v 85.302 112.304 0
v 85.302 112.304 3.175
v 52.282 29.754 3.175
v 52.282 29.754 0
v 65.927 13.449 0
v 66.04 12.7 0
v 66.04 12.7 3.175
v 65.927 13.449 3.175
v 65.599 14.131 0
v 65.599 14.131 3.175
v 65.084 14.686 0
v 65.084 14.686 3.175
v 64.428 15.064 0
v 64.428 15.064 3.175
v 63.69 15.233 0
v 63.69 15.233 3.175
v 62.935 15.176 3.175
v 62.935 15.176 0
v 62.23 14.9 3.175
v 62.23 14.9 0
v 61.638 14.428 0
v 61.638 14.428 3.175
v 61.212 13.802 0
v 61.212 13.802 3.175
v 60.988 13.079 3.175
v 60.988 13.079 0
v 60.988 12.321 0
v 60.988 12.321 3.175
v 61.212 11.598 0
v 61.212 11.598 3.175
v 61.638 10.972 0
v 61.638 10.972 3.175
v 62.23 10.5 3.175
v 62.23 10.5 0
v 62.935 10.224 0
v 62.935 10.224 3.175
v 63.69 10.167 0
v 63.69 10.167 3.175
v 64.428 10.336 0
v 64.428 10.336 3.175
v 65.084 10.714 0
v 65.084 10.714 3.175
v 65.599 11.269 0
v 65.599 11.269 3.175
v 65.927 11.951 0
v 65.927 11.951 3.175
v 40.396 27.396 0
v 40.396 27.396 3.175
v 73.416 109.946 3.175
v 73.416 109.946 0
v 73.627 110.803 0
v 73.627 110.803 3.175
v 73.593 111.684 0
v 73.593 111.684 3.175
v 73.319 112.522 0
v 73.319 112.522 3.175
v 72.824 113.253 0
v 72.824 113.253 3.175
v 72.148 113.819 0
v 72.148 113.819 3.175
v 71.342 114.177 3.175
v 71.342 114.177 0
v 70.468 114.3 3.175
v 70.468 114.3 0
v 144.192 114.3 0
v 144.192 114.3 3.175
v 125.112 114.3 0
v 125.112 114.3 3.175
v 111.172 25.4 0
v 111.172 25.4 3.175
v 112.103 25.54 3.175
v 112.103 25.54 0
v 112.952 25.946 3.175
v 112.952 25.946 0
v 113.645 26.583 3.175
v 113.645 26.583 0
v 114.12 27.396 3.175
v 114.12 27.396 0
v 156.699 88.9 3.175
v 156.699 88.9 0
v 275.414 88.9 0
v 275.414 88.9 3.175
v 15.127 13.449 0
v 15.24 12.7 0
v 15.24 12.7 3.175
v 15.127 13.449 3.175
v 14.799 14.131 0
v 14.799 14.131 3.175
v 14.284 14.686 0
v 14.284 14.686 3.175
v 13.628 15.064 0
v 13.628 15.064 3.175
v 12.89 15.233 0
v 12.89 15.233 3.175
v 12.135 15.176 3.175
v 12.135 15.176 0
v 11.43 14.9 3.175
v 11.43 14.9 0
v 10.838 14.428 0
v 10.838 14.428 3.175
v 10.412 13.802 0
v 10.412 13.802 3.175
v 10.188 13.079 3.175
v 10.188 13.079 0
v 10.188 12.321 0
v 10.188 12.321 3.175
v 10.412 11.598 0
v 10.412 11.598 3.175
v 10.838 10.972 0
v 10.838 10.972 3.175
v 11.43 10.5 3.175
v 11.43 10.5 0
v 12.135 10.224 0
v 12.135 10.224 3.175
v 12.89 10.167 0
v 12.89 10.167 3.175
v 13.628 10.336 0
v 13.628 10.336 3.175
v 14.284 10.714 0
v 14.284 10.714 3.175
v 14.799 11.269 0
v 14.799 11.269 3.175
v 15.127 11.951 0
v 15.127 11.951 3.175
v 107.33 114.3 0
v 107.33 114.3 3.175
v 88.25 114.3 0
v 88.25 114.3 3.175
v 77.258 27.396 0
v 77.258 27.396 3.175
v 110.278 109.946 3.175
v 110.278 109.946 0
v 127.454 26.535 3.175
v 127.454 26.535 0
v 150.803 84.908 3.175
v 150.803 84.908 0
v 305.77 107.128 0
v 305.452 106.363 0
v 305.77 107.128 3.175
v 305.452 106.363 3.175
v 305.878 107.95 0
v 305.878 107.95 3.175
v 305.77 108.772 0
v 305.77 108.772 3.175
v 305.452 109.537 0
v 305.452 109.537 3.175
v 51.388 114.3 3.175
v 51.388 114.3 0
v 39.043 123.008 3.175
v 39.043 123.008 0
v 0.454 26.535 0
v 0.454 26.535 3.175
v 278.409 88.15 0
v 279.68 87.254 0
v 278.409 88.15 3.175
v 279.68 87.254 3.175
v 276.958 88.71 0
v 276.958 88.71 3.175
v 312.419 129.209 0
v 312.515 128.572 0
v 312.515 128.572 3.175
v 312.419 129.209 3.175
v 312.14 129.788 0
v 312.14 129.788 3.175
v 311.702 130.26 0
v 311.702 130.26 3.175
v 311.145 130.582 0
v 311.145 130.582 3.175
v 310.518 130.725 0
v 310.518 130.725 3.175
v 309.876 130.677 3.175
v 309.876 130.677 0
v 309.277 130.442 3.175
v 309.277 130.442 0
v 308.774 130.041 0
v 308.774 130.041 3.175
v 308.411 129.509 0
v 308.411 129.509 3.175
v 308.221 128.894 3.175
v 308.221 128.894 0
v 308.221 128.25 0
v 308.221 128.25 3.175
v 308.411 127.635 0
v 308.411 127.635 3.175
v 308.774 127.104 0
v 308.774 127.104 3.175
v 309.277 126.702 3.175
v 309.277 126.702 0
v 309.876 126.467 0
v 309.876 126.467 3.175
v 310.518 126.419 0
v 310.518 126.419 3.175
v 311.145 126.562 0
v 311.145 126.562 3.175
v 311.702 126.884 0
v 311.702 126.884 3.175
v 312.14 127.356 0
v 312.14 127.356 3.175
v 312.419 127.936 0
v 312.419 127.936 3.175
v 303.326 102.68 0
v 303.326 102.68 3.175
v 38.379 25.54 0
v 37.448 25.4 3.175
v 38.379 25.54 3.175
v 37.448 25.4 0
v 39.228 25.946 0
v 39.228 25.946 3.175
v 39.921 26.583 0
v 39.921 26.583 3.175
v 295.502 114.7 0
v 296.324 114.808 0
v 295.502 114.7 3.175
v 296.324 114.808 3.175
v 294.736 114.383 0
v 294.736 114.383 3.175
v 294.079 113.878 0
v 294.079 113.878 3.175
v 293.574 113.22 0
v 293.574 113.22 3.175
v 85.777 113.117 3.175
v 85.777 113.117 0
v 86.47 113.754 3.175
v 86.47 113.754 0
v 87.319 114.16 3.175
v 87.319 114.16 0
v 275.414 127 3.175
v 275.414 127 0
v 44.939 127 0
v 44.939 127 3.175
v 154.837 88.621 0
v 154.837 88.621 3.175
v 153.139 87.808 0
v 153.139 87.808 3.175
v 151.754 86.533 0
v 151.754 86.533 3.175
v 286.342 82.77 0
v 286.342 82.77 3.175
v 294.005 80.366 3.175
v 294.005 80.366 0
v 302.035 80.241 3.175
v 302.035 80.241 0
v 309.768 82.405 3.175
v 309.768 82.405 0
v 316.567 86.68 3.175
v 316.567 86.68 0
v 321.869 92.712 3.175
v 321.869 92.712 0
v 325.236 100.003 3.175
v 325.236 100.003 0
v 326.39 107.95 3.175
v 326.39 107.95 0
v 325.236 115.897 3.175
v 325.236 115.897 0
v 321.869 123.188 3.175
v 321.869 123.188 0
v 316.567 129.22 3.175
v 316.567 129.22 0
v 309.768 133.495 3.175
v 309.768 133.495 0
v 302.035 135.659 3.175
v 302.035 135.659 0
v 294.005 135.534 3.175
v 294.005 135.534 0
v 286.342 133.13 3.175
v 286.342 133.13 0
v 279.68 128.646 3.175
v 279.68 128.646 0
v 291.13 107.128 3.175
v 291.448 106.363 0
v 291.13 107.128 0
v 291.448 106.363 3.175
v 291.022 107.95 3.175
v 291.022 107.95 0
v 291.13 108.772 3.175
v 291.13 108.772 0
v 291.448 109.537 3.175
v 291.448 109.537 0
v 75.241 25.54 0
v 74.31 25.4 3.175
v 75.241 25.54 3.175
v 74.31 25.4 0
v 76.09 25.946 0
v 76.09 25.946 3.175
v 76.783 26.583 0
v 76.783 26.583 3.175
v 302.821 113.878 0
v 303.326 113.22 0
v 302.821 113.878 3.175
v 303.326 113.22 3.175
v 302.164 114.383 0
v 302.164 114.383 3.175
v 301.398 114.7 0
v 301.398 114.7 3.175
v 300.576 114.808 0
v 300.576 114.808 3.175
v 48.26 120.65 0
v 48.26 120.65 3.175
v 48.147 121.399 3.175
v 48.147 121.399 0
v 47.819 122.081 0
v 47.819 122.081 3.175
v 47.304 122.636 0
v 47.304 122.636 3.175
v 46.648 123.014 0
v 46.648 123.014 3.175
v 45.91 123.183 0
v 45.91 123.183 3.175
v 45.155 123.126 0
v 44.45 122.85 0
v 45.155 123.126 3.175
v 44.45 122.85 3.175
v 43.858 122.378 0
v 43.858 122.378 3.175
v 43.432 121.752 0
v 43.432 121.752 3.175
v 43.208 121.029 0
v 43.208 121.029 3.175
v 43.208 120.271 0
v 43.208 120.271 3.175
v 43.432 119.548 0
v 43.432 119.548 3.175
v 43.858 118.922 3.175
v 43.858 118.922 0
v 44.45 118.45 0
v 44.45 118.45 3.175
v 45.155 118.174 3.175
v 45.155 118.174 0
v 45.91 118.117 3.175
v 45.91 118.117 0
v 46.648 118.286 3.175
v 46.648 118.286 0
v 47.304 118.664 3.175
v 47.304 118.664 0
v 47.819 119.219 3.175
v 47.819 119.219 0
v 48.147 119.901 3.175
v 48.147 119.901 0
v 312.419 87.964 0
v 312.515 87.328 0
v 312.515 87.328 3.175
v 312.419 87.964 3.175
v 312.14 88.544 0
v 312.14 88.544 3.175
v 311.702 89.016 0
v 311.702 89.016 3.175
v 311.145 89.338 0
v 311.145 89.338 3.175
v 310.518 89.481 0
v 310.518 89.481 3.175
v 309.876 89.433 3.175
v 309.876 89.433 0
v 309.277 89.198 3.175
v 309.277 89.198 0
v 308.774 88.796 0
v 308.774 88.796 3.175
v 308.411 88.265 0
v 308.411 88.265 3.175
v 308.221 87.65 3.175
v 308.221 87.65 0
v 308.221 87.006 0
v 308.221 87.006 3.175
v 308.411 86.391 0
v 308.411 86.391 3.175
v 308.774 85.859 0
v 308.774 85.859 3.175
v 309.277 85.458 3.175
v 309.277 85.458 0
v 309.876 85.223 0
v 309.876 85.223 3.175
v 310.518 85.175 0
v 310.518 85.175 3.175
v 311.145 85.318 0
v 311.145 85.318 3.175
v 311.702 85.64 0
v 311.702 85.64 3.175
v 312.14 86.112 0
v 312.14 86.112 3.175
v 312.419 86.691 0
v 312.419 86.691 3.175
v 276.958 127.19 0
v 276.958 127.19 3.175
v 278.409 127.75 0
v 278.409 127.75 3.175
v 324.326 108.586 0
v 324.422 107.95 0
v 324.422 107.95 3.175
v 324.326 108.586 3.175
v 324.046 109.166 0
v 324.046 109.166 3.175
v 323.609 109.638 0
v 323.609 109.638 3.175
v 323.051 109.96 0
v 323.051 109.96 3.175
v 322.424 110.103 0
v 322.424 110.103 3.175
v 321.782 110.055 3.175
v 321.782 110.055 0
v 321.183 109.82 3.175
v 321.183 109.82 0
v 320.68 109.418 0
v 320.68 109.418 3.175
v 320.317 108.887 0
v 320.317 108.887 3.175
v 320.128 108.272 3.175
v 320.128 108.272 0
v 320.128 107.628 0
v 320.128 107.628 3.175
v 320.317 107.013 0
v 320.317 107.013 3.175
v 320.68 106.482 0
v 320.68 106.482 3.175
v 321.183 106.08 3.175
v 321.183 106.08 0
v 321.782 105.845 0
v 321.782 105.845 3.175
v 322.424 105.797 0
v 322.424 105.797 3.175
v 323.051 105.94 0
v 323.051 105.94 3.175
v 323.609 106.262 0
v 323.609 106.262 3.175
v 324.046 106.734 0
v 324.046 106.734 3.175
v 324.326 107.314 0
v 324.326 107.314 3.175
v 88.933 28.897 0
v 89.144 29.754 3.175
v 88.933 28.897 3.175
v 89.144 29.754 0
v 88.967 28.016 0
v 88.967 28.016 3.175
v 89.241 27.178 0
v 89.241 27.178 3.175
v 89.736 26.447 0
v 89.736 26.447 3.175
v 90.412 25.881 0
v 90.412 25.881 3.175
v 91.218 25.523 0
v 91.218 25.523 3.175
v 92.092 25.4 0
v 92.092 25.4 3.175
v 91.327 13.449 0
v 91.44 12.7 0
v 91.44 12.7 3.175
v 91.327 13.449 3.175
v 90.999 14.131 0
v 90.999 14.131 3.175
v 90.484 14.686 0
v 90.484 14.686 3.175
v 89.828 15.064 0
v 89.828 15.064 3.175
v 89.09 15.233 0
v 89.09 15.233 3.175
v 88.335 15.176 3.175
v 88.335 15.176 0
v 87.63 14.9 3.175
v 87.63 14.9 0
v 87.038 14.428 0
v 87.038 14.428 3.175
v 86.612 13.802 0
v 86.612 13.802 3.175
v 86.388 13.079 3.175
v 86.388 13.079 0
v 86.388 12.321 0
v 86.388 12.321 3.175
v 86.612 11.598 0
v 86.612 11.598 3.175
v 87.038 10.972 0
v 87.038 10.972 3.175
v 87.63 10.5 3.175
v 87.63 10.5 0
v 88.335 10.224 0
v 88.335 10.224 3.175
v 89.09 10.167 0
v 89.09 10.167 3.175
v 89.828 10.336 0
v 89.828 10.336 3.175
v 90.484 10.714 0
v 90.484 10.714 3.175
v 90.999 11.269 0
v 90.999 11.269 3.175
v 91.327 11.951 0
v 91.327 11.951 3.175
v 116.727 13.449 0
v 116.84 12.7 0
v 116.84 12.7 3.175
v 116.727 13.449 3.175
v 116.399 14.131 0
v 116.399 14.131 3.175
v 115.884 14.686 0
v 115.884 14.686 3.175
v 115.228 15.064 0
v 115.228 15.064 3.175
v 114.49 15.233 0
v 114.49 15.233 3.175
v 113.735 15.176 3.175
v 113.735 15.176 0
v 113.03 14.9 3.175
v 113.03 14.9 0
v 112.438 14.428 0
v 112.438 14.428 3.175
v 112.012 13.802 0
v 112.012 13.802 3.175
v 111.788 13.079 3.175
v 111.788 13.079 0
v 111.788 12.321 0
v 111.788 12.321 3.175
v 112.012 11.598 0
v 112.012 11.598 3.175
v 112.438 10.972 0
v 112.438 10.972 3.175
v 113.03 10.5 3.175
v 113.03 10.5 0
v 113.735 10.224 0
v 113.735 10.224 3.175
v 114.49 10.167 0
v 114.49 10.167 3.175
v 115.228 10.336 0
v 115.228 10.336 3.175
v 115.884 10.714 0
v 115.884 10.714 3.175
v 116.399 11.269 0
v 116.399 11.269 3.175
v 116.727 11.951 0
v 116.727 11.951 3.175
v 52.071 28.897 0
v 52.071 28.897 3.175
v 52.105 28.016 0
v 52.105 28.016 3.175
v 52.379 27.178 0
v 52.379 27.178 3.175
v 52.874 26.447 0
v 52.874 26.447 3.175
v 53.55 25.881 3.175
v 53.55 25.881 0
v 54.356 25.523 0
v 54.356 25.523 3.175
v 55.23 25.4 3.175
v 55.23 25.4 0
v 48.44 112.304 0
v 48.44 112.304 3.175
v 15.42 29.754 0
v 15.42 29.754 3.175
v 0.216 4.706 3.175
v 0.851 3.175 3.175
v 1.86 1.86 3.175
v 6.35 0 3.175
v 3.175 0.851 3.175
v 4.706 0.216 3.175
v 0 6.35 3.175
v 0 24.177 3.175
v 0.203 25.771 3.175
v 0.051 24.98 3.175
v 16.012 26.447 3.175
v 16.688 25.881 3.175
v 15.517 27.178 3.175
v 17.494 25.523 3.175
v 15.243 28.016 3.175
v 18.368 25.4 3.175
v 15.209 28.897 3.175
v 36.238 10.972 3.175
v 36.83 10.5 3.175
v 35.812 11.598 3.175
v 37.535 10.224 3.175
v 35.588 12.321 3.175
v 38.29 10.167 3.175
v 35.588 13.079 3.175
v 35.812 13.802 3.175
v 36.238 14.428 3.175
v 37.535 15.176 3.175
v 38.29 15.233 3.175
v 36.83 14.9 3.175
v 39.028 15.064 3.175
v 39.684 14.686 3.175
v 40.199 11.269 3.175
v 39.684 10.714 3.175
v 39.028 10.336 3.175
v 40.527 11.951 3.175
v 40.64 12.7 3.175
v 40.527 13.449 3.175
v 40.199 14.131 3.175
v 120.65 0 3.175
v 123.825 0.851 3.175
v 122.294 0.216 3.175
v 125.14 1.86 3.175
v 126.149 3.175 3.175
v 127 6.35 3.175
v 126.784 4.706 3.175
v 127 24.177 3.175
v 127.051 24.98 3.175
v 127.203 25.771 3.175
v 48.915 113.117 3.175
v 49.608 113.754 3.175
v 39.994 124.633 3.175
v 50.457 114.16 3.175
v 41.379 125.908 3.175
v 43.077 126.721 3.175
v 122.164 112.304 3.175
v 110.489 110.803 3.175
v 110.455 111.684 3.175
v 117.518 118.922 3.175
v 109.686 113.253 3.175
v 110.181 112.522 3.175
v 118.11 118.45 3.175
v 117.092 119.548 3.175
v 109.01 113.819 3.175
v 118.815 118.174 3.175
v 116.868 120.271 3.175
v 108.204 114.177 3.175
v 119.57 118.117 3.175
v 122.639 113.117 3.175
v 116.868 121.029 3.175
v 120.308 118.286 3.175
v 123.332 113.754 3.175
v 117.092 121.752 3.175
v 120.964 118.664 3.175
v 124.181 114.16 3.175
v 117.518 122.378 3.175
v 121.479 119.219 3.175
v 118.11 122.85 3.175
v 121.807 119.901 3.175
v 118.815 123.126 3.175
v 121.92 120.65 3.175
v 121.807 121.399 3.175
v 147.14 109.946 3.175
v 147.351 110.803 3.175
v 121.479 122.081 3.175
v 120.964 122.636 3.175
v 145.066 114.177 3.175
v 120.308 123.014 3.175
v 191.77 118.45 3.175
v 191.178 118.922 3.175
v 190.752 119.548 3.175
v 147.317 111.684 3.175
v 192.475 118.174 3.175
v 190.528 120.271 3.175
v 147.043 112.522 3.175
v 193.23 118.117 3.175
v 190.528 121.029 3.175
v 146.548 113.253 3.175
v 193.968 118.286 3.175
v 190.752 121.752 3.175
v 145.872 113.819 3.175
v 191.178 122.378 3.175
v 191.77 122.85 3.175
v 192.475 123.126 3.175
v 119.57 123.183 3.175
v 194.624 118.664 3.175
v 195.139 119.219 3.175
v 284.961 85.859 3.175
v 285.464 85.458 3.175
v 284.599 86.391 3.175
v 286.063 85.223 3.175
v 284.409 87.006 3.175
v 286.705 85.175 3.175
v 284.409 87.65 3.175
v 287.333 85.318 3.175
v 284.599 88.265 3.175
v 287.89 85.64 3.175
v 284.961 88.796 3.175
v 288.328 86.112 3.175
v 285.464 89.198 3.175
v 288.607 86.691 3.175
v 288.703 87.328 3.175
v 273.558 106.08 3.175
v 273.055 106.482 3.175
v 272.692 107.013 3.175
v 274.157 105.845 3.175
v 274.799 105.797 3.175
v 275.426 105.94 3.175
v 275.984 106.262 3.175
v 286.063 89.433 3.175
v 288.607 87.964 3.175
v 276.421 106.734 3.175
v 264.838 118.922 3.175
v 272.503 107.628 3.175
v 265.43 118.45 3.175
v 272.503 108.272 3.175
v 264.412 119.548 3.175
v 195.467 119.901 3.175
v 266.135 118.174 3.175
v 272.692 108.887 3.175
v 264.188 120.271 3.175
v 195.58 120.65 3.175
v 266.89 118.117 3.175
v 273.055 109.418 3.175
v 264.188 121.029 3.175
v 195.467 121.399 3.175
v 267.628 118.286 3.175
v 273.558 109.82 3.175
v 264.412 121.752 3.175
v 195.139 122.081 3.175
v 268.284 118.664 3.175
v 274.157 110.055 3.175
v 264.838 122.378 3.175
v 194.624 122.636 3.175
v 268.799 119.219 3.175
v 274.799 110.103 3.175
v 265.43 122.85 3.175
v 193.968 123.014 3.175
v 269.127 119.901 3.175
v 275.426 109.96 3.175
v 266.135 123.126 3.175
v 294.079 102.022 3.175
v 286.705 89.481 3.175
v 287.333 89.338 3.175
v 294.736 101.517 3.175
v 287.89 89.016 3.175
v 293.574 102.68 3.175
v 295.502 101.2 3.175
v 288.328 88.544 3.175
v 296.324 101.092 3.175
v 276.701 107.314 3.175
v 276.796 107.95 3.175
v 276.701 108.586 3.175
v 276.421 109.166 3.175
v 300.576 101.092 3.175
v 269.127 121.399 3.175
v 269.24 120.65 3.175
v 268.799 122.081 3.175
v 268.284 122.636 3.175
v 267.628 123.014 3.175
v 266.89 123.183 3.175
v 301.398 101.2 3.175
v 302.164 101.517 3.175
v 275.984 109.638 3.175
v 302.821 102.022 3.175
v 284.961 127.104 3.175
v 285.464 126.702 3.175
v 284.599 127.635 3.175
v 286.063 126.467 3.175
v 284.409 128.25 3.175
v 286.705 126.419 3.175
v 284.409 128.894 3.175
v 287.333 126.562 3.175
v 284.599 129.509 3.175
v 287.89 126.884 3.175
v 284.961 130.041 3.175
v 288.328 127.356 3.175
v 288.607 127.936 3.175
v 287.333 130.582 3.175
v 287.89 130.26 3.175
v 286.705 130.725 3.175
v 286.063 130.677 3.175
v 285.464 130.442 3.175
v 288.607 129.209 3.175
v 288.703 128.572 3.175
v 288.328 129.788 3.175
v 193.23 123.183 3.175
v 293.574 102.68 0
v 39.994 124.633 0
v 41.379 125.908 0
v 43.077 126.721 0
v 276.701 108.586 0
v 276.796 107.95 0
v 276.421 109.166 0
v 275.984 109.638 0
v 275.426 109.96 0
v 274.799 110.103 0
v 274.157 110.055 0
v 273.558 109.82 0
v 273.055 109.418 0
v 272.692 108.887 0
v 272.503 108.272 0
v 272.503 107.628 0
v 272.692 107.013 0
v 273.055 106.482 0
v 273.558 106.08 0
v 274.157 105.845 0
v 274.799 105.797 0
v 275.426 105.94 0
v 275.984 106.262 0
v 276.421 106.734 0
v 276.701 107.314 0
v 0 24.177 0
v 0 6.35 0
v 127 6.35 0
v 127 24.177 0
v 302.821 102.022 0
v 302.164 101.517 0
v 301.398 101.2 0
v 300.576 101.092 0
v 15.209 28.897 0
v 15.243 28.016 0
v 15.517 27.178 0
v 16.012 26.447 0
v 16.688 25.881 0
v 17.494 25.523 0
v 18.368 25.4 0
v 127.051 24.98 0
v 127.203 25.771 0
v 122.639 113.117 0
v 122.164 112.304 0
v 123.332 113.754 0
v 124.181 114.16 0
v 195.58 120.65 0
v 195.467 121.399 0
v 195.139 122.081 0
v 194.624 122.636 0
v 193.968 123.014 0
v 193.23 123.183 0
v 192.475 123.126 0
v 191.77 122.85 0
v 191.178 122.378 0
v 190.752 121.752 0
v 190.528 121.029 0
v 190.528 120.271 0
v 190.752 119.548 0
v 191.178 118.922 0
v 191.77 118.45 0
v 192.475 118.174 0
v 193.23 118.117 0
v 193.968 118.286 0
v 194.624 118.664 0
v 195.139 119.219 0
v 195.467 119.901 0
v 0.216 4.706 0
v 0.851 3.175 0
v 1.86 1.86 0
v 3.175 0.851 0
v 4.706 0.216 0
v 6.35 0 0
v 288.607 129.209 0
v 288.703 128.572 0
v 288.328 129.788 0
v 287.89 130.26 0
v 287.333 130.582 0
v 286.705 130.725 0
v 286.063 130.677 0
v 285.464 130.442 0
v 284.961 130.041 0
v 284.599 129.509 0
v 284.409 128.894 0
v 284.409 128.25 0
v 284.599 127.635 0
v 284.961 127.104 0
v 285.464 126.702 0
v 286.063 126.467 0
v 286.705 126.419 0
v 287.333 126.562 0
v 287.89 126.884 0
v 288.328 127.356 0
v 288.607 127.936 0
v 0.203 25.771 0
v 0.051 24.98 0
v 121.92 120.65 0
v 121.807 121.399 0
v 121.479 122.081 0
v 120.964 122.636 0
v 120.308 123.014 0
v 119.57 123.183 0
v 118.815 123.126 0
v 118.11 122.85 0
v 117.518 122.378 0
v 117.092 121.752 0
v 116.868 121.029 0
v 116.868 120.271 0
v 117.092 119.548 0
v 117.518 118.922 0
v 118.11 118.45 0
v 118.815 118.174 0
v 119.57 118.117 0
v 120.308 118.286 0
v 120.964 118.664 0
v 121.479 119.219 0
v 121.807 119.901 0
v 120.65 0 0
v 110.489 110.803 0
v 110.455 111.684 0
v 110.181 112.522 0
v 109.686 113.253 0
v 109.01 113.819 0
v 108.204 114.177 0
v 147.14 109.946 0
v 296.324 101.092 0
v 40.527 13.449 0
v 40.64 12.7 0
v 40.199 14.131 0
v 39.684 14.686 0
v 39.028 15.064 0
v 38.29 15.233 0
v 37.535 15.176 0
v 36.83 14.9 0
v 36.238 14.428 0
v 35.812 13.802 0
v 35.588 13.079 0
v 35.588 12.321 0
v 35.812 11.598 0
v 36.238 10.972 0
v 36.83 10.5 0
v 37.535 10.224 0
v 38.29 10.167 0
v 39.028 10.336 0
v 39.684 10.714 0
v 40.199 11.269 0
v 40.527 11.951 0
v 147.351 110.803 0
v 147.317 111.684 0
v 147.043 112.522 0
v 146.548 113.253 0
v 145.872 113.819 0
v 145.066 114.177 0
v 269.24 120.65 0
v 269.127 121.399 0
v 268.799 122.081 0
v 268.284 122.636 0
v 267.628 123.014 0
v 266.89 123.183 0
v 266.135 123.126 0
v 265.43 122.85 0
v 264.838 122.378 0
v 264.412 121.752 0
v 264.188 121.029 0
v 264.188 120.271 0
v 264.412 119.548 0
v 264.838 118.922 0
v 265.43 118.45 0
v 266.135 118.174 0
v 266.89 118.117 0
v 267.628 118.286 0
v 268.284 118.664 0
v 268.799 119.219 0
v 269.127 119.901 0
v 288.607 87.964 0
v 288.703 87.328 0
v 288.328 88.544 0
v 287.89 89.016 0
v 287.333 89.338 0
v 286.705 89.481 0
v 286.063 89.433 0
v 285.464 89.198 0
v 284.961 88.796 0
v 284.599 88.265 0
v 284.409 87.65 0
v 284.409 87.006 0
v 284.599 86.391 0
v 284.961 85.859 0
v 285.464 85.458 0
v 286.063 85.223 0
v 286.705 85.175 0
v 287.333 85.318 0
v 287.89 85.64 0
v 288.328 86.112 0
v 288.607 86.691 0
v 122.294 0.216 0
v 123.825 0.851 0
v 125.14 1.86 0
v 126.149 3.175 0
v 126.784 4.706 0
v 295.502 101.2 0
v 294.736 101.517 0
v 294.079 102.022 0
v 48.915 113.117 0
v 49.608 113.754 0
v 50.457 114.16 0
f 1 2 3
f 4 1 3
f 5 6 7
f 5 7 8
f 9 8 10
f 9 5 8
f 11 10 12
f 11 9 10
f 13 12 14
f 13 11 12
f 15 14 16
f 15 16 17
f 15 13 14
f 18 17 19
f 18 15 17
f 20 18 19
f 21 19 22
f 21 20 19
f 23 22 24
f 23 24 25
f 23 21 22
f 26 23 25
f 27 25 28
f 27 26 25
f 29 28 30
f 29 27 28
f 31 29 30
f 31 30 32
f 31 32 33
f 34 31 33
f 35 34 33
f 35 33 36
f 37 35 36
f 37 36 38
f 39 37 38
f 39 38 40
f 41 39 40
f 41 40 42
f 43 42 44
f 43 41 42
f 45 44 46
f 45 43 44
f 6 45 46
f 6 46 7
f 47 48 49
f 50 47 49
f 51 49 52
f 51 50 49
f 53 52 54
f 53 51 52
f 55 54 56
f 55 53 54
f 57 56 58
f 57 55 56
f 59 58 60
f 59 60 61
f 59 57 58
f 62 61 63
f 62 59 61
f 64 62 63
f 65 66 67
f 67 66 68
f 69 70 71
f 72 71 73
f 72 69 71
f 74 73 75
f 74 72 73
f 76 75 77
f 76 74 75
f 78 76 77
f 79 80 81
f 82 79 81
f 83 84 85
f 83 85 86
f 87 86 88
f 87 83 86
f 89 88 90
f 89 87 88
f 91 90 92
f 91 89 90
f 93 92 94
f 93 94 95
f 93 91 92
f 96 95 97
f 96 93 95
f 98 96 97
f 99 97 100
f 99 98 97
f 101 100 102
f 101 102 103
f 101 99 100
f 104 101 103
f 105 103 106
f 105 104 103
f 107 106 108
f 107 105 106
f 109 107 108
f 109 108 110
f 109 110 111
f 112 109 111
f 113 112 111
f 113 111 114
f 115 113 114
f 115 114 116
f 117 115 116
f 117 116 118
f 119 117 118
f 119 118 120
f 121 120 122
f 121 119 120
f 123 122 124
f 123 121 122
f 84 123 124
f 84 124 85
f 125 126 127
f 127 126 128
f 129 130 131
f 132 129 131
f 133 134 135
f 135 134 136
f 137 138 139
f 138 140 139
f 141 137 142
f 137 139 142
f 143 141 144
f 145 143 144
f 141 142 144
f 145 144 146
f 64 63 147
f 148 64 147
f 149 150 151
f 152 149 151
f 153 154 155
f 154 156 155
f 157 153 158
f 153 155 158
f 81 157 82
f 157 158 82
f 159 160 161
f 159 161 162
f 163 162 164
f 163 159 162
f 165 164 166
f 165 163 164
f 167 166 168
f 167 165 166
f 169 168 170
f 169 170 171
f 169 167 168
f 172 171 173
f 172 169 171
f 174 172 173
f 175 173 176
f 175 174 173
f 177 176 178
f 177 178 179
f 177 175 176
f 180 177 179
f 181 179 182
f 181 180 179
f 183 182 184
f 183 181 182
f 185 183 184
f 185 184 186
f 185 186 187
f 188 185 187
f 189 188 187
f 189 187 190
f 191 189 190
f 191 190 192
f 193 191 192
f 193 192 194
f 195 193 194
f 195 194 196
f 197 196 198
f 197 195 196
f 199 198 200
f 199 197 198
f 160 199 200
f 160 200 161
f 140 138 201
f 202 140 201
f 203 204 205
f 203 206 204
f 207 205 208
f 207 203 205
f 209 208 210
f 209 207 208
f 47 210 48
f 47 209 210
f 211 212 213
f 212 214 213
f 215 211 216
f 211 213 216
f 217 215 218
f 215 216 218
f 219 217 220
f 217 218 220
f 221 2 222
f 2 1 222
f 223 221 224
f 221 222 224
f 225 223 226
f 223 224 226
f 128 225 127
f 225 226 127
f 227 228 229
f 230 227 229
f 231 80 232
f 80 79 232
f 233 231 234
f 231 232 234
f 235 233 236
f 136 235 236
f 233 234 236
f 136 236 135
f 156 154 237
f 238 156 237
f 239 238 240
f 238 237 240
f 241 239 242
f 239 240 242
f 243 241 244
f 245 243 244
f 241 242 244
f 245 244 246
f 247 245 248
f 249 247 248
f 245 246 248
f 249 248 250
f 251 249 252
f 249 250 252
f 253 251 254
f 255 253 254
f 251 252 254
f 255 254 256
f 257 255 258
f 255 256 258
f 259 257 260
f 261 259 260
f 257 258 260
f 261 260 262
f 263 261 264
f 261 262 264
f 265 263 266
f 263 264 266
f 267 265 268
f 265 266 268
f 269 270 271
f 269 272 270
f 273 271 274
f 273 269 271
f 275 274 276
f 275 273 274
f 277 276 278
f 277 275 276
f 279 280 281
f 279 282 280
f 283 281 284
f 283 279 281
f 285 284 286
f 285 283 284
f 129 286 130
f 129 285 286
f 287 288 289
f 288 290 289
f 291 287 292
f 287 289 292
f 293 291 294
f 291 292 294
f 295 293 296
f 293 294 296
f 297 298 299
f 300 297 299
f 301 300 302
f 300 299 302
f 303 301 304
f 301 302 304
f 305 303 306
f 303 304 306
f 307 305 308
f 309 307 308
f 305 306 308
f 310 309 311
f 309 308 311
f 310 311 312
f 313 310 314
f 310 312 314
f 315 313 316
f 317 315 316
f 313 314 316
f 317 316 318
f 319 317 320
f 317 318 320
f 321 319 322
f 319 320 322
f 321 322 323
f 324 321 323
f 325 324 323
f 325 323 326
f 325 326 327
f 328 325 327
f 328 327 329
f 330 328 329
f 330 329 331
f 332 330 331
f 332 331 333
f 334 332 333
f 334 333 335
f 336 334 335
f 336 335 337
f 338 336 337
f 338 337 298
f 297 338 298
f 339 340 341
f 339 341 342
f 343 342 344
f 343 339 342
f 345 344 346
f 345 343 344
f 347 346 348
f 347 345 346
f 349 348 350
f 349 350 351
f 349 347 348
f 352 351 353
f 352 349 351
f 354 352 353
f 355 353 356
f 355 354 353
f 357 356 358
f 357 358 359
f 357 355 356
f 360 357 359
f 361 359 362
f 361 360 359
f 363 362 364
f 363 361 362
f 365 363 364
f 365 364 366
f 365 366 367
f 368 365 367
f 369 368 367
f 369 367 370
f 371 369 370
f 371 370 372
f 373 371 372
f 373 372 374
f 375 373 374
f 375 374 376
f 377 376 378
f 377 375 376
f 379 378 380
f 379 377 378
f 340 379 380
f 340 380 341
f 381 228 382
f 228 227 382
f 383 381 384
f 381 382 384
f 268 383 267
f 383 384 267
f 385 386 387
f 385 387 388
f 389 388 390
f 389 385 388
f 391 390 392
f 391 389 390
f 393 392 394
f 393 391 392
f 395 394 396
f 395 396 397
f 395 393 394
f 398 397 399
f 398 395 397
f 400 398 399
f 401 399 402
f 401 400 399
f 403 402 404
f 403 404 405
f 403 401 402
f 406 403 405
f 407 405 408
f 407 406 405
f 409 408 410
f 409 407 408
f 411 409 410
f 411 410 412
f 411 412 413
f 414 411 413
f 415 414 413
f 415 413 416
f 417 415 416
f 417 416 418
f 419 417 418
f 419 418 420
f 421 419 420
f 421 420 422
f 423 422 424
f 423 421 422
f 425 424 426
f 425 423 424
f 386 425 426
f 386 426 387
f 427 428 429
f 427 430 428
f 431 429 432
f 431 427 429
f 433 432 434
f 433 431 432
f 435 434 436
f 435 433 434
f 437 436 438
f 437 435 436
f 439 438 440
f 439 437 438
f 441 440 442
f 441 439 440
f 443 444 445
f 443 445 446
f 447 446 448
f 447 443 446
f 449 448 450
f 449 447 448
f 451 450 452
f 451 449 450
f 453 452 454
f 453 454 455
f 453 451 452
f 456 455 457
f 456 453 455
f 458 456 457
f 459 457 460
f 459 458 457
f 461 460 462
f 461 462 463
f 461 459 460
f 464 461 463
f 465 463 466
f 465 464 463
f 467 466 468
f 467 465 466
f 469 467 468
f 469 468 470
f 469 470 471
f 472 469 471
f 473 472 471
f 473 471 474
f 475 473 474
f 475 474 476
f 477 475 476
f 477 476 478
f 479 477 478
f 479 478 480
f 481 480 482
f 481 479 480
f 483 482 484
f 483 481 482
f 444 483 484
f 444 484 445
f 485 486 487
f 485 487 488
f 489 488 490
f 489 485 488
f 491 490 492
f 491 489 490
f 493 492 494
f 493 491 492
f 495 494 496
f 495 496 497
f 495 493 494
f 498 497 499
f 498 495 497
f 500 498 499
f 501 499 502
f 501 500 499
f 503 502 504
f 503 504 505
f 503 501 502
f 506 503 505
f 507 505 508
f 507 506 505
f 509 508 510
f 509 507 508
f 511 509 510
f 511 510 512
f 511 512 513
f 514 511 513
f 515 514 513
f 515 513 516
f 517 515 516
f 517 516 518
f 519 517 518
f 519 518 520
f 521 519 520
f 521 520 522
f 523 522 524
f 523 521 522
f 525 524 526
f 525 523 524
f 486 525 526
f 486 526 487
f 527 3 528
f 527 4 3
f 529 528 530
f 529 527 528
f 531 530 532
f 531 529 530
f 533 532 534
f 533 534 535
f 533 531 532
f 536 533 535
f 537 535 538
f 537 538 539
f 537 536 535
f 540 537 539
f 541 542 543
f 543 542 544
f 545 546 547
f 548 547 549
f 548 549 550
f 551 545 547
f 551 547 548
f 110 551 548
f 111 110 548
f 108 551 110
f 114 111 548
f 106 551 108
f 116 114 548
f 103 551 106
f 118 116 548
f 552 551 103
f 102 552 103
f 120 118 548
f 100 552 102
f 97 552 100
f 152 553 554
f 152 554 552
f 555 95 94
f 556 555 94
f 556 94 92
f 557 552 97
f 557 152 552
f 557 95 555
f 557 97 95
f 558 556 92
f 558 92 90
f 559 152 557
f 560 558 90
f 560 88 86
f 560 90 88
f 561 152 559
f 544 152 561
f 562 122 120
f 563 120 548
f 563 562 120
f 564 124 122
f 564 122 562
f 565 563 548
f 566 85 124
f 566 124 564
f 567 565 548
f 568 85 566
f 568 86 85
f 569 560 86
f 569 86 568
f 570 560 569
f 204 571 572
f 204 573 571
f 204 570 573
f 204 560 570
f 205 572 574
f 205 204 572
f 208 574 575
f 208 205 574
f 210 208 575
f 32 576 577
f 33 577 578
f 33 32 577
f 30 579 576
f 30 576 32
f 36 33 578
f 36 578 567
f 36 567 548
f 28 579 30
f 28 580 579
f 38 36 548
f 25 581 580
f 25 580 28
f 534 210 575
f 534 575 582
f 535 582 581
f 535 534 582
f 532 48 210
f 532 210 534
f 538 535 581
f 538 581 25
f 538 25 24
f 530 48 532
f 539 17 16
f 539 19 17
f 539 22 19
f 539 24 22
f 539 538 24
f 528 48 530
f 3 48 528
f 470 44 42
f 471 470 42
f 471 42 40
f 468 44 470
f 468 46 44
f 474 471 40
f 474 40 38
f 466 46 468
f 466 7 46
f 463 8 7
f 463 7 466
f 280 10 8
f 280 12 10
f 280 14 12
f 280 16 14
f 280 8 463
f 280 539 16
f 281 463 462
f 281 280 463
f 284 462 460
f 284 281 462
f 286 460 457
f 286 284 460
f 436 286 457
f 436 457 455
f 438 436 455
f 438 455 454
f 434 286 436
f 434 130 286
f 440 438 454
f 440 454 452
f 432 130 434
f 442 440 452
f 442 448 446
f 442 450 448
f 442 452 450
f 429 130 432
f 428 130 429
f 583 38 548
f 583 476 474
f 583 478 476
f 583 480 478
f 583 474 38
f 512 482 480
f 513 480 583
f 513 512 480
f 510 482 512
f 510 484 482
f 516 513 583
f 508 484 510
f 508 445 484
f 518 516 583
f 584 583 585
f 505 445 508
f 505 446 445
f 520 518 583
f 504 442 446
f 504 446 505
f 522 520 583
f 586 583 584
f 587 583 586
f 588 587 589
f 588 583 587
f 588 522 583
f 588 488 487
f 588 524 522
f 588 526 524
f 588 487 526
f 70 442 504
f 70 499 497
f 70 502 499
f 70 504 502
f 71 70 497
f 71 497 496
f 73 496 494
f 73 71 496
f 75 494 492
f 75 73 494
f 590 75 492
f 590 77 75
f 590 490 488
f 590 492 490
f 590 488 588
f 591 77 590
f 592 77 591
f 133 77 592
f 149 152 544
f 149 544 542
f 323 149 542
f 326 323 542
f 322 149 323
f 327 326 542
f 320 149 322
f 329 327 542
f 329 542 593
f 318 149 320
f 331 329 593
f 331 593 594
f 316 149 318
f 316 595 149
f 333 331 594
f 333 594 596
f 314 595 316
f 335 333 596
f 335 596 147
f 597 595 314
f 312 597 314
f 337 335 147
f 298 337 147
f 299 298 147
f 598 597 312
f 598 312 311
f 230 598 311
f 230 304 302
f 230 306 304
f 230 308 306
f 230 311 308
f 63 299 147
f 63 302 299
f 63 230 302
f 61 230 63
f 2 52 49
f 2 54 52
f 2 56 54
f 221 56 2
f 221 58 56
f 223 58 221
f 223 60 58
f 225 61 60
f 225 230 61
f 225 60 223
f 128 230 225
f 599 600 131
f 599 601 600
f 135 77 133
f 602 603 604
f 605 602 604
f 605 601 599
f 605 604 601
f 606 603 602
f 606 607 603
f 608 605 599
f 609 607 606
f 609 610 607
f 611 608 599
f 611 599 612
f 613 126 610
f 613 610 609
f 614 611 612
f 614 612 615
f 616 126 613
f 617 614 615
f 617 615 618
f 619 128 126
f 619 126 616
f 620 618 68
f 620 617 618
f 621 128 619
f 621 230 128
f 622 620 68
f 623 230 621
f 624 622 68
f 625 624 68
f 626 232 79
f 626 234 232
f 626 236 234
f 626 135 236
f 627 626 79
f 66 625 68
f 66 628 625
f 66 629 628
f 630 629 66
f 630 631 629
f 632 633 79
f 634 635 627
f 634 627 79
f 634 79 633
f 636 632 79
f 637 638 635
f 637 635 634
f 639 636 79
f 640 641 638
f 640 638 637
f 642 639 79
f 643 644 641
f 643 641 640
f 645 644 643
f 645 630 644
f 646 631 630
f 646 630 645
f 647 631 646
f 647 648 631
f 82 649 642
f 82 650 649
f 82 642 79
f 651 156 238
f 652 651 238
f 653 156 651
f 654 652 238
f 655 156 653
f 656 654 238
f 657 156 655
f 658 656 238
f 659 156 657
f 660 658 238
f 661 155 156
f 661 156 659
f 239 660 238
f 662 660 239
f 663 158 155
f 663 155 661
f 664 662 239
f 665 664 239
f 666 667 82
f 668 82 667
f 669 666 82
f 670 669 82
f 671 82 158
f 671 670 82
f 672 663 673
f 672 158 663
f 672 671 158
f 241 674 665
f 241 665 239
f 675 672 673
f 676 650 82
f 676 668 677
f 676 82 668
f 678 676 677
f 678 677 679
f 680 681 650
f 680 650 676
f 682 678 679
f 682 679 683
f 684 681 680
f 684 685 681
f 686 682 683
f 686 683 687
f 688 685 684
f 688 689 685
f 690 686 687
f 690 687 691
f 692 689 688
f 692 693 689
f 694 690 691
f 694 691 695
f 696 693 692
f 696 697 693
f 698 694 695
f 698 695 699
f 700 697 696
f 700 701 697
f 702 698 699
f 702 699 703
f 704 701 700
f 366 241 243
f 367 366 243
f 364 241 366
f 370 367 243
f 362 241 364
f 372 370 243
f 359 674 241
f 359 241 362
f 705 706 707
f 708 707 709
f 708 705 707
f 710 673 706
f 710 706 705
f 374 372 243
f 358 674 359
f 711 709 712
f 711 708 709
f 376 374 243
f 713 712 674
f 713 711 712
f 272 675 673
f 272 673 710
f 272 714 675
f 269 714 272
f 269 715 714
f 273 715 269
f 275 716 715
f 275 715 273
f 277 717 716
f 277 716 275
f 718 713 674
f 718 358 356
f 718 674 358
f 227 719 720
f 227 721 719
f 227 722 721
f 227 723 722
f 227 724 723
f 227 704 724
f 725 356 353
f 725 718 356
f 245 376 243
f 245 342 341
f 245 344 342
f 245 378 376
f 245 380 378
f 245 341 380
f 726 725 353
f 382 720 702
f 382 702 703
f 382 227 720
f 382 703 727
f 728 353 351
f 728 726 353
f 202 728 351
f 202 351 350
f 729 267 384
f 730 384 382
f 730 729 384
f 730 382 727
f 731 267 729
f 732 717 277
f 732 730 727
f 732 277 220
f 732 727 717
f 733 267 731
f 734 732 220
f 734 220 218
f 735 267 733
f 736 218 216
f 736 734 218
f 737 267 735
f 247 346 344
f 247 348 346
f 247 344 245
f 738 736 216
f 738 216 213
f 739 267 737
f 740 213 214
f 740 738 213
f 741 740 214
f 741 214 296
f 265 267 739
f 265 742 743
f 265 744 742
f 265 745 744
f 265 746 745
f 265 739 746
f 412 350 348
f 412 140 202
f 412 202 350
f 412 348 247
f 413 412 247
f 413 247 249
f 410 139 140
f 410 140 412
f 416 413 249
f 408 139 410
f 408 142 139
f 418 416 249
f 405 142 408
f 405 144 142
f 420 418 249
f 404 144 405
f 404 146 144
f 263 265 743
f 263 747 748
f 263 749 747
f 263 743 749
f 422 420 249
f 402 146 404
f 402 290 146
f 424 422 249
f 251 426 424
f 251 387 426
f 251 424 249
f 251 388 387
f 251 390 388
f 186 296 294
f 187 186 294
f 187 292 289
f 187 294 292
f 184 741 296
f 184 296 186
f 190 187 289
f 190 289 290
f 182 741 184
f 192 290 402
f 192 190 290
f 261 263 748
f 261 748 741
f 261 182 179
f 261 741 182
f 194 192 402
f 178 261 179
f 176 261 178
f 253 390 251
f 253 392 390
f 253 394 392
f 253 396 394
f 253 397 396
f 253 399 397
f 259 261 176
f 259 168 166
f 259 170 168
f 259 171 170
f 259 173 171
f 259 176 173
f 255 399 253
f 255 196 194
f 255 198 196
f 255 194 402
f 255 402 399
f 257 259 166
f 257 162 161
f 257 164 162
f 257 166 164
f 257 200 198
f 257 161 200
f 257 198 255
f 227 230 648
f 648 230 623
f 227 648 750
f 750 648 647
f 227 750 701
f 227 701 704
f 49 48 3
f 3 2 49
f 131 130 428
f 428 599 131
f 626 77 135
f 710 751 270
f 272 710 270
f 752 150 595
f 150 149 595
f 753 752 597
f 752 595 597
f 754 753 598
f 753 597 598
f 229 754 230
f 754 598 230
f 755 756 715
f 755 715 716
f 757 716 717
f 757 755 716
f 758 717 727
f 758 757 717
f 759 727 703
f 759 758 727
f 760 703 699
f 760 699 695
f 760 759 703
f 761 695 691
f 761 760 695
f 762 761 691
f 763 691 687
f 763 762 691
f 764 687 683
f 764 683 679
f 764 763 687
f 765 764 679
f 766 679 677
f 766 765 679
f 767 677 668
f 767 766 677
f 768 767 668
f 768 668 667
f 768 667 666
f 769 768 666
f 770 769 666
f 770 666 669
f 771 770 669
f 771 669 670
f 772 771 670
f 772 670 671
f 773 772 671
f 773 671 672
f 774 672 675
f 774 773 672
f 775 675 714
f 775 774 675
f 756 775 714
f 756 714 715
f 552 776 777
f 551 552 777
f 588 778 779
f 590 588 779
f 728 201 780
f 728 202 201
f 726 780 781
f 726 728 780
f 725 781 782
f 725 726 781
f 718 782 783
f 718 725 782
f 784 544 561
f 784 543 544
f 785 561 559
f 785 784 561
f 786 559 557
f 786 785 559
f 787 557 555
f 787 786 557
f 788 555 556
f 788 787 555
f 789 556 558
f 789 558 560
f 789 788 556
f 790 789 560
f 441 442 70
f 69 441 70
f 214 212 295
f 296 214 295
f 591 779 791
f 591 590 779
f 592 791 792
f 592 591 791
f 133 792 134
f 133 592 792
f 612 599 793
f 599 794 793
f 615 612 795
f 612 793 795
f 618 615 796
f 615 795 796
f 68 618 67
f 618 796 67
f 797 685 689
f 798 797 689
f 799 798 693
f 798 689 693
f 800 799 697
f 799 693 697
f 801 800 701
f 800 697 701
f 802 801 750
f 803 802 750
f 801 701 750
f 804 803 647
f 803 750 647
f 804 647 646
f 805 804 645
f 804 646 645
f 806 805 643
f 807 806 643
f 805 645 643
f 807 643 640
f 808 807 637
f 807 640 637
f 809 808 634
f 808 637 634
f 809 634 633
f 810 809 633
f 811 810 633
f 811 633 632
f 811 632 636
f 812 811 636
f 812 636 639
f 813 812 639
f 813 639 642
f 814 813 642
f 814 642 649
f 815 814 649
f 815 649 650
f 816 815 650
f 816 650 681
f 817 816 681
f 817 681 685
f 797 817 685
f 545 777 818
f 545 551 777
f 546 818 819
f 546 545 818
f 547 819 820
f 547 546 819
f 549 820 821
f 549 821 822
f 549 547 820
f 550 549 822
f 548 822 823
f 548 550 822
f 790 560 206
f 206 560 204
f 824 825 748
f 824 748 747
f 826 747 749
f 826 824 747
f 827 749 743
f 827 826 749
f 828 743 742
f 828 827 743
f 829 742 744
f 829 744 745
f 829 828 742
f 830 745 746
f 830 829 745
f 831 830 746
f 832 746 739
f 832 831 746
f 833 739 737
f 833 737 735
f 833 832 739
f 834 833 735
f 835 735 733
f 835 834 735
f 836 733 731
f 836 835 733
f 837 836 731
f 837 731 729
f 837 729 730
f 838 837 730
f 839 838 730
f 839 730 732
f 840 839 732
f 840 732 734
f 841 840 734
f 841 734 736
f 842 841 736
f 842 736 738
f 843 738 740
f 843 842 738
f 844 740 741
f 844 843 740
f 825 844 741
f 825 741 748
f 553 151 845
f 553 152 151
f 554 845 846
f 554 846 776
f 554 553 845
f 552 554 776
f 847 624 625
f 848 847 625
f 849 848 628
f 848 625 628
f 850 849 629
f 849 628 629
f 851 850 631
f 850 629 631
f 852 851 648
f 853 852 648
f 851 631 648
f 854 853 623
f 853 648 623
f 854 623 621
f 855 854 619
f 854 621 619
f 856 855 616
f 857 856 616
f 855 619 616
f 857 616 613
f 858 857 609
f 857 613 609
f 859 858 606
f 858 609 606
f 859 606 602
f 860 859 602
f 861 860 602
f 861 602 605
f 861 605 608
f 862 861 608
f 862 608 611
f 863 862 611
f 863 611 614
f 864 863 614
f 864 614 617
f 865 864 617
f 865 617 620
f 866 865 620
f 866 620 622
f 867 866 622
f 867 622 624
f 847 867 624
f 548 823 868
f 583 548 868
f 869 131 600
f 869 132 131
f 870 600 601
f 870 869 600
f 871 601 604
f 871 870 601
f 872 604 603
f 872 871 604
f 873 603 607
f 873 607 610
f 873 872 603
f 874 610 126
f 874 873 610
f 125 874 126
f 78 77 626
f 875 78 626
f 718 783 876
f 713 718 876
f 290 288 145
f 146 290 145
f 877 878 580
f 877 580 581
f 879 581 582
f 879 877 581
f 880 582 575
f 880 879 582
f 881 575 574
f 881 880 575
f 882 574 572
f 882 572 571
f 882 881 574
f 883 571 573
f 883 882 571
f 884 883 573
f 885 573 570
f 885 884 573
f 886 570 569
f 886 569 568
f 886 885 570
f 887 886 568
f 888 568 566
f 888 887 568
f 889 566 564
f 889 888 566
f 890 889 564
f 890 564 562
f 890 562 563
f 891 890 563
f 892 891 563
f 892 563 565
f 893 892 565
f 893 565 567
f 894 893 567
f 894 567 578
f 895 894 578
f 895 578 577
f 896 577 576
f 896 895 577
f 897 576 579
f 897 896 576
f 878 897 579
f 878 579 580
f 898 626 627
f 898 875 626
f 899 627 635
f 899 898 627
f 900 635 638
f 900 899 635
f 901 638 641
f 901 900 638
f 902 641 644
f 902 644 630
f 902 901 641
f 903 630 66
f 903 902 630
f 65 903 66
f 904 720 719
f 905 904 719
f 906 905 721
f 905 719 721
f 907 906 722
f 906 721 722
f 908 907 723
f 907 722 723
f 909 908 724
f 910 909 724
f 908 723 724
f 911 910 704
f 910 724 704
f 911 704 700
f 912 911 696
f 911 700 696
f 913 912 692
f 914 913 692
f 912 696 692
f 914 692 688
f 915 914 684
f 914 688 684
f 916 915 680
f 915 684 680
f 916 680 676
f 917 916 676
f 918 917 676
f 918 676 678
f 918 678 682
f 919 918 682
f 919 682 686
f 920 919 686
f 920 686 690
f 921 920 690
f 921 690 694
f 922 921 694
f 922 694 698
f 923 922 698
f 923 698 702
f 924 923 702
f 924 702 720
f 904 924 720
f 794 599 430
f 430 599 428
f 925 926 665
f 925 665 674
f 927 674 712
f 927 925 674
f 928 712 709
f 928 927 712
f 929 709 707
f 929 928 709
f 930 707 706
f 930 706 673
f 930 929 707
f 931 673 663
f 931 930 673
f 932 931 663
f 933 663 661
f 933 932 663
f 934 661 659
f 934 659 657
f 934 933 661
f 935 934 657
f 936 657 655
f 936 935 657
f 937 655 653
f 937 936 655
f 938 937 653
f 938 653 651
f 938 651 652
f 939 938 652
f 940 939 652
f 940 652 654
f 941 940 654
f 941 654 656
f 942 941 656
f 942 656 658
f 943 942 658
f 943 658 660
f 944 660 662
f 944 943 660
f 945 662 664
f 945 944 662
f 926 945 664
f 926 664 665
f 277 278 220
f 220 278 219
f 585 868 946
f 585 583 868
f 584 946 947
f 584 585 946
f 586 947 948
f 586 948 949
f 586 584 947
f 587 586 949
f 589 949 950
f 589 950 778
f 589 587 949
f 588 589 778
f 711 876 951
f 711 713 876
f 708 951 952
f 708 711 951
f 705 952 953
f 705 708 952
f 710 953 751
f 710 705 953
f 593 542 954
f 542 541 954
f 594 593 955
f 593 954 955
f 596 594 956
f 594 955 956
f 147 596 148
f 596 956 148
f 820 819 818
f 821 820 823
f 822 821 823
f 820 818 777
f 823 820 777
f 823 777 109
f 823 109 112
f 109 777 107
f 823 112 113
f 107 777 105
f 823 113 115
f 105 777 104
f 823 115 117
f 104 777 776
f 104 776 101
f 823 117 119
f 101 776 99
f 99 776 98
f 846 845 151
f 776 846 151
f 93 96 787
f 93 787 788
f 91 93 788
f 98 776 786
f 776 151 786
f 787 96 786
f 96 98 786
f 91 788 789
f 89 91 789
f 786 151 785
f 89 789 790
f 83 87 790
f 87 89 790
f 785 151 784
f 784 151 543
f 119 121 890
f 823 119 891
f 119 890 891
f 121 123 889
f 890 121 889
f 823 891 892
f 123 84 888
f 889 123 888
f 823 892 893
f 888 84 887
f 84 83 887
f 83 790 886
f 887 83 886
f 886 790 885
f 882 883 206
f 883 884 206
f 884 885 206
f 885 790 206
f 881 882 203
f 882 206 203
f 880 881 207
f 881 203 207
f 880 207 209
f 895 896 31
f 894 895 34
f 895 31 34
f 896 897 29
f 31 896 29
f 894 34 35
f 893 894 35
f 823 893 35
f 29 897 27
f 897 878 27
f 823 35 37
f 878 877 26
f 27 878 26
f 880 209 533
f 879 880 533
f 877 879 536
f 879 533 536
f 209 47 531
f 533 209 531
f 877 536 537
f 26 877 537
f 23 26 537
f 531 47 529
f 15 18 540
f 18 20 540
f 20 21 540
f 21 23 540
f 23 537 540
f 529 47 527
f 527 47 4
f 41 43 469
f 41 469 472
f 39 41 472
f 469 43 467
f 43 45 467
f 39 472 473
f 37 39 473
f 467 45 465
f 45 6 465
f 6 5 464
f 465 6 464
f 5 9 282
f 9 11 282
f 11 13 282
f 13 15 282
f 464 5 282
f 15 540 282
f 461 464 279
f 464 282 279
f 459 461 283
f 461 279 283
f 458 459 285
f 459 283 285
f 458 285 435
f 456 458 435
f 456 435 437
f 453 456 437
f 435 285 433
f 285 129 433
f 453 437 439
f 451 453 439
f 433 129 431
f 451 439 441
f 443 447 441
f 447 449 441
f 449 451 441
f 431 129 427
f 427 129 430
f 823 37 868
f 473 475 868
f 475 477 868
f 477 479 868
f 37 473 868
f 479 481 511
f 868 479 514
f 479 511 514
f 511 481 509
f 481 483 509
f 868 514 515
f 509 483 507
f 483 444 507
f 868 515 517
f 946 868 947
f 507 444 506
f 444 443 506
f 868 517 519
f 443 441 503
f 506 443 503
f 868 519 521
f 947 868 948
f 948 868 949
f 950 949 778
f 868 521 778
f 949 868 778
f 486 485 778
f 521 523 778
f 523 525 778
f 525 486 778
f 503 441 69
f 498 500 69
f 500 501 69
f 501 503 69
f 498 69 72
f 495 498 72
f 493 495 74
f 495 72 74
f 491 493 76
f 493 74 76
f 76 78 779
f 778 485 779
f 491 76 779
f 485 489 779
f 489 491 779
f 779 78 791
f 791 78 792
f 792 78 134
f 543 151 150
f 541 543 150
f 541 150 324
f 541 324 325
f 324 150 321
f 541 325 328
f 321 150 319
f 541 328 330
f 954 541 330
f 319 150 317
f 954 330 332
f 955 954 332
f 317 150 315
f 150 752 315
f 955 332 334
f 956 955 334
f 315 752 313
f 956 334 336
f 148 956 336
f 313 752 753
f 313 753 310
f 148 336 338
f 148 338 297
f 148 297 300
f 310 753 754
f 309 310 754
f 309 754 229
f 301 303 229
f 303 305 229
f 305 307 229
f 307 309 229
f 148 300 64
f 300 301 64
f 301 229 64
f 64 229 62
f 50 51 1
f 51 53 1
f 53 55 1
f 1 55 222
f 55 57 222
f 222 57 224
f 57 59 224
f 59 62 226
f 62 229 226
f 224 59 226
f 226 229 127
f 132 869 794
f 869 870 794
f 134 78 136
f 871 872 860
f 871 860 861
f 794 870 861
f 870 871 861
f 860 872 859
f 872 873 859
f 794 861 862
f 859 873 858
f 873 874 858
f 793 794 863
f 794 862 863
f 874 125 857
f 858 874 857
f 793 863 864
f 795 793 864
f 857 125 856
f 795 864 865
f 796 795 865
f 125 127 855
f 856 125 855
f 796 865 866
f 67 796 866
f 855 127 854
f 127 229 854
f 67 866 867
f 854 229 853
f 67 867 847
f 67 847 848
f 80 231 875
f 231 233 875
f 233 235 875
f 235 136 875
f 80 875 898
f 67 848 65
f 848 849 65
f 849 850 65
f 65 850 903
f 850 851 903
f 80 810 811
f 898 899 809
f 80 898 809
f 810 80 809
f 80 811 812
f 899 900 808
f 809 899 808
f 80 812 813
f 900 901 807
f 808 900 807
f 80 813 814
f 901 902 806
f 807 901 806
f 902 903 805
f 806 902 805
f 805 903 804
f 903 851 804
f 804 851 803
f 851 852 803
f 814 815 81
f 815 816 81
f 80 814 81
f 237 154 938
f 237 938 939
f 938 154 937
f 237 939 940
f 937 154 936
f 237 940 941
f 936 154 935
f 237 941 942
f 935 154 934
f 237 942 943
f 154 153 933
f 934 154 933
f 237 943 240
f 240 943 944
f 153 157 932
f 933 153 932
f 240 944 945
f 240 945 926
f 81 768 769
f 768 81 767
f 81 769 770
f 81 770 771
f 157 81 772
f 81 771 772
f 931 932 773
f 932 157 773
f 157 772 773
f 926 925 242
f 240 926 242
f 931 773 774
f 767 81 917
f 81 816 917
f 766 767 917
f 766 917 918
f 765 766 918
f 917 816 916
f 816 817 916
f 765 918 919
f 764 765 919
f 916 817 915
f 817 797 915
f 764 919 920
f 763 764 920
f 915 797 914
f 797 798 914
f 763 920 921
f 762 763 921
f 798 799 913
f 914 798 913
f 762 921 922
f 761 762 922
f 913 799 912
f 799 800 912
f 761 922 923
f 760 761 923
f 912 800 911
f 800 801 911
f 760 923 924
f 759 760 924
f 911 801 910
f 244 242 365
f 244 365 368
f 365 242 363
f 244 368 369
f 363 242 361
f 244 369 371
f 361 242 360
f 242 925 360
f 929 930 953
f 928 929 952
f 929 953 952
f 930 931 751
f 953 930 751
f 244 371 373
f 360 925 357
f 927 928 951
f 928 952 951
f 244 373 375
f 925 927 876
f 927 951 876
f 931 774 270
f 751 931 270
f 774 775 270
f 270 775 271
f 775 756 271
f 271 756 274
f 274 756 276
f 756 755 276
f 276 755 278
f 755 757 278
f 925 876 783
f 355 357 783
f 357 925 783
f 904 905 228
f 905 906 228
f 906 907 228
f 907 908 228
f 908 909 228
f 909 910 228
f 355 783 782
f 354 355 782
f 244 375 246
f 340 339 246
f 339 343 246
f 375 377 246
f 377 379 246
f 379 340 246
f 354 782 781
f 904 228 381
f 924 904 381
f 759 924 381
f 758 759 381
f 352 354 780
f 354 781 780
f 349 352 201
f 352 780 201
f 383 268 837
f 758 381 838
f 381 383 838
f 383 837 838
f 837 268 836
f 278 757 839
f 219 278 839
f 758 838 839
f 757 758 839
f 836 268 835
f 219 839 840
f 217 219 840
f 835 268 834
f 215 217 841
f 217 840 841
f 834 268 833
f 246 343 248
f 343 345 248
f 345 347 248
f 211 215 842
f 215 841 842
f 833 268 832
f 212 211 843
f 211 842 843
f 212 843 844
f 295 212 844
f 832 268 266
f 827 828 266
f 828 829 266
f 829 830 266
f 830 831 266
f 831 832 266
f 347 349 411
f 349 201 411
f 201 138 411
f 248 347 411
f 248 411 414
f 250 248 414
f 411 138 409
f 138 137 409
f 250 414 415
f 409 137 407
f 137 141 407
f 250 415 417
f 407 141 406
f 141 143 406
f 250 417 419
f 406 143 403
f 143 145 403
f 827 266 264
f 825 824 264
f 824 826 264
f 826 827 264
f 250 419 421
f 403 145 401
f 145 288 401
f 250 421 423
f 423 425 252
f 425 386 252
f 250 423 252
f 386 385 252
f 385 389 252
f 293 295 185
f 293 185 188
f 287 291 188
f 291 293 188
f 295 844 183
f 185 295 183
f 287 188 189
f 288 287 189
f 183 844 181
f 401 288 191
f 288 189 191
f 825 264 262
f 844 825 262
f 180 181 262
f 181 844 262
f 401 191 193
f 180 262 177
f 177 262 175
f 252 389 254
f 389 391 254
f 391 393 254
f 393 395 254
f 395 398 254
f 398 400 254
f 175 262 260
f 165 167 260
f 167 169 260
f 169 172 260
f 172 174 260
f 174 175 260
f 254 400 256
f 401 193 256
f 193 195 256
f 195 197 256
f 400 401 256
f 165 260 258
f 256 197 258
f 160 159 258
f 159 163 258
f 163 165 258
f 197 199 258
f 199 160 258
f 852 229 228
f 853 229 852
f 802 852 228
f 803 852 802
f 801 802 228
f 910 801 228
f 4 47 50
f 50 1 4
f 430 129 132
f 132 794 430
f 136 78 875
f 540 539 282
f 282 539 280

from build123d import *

# Parameters (mm, degrees)
SKETCH1_R           = 2.54
SKETCH1_R_2         = 2.159
BOSS_EXTRUDE1_DEPTH = 3.175
FILLET1_R           = 6.35
CUT_EXTRUDE1_DEPTH  = 354.562731103
FILLET2_R           = 3.175
SKETCH3_R           = 2.54
CUT_EXTRUDE2_DEPTH  = 354.562731103
FILLET3_R           = 3.175


with BuildPart() as part:
    # Sketch1 → Boss-Extrude1 (new body)
    with BuildSketch(Plane.XY):
        with BuildLine():
            Line((40.64, 127), (0, 25.4))
            Line((0, 25.4), (0, 0))
            Line((0, 0), (127, 0))
            Line((127, 0), (127, 25.4))
            Line((127, 25.4), (152.4, 88.9))
            Line((152.4, 88.9), (278.011284287, 88.9))
            ThreePointArc((278.011284287, 88.9), (326.39, 107.95), (278.011284287, 127))
            Line((278.011284287, 127), (40.64, 127))
        make_face()
        with Locations((12.7, 12.7)):
            Circle(SKETCH1_R, mode=Mode.SUBTRACT)
        with Locations((38.1, 12.7)):
            Circle(SKETCH1_R, mode=Mode.SUBTRACT)
        with Locations((63.5, 12.7)):
            Circle(SKETCH1_R, mode=Mode.SUBTRACT)
        with Locations((88.9, 12.7)):
            Circle(SKETCH1_R, mode=Mode.SUBTRACT)
        with Locations((114.3, 12.7)):
            Circle(SKETCH1_R, mode=Mode.SUBTRACT)
        with Locations((286.54375, 128.572229928)):
            Circle(SKETCH1_R_2, mode=Mode.SUBTRACT)
        with Locations((310.35625, 128.572229928)):
            Circle(SKETCH1_R_2, mode=Mode.SUBTRACT)
        with Locations((310.35625, 87.327770072)):
            Circle(SKETCH1_R_2, mode=Mode.SUBTRACT)
        with Locations((286.54375, 87.327770072)):
            Circle(SKETCH1_R_2, mode=Mode.SUBTRACT)
        Polygon((302.409468146, 101.092), (294.490531854, 101.092), (290.531063708, 107.95), (294.490531854, 114.808), (302.409468146, 114.808), (306.368936292, 107.95), align=None, mode=Mode.SUBTRACT)
        with Locations((274.6375, 107.95)):
            Circle(SKETCH1_R_2, mode=Mode.SUBTRACT)
        with Locations((322.2625, 107.95)):
            Circle(SKETCH1_R_2, mode=Mode.SUBTRACT)
    extrude(amount=BOSS_EXTRUDE1_DEPTH)

    # Fillet1
    fillet1_edges = [part.edges().sort_by_distance(p)[0] for p in [
        (278.011284287, 88.9, 1.5875),
        (152.4, 88.9, 1.5875),
        (127, 25.4, 1.5875),
        (127, 0, 1.5875),
        (0, 0, 1.5875),
        (0, 25.4, 1.5875),
        (40.64, 127, 1.5875),
        (278.011284287, 127, 1.5875),
    ]]
    fillet(fillet1_edges, radius=FILLET1_R)

    # Sketch2 → Cut-Extrude1 (cut, through all)
    with BuildSketch(Plane.XY.offset(3.175)):
        Polygon((49.23831861, 114.3), (13.67831861, 25.4), (39.597669611, 25.4), (75.157669611, 114.3), align=None)
        Polygon((86.100324499, 114.3), (50.540324499, 25.4), (76.459675501, 25.4), (112.019675501, 114.3), align=None)
        Polygon((122.962330389, 114.3), (87.402330389, 25.4), (113.32168139, 25.4), (148.88168139, 114.3), align=None)
    extrude(amount=-CUT_EXTRUDE1_DEPTH, mode=Mode.SUBTRACT)

    # Fillet2
    fillet2_edges = [part.edges().sort_by_distance(p)[0] for p in [
        (76.459675501, 25.4, 1.5875),
        (50.540324499, 25.4, 1.5875),
        (86.100324499, 114.3, 1.5875),
        (112.019675501, 114.3, 1.5875),
        (148.88168139, 114.3, 1.5875),
        (113.32168139, 25.4, 1.5875),
        (87.402330389, 25.4, 1.5875),
        (122.962330389, 114.3, 1.5875),
        (39.597669611, 25.4, 1.5875),
        (13.67831861, 25.4, 1.5875),
        (49.23831861, 114.3, 1.5875),
        (75.157669611, 114.3, 1.5875),
    ]]
    fillet(fillet2_edges, radius=FILLET2_R)

    # Sketch3 → Cut-Extrude2 (cut, through all)
    with BuildSketch(Plane.XY.offset(3.175)):
        with Locations((45.72, 120.65)):
            Circle(SKETCH3_R)
        with Locations((119.38, 120.65)):
            Circle(SKETCH3_R)
        with Locations((193.04, 120.65)):
            Circle(SKETCH3_R)
        with Locations((266.7, 120.65)):
            Circle(SKETCH3_R)
    extrude(amount=-CUT_EXTRUDE2_DEPTH, mode=Mode.SUBTRACT)

    # Fillet3
    fillet3_edges = [part.edges().sort_by_distance(p)[0] for p in [
        (302.409468146, 101.092, 1.5875),
        (306.368936292, 107.95, 1.5875),
        (302.409468146, 114.808, 1.5875),
        (294.490531854, 114.808, 1.5875),
        (290.531063708, 107.95, 1.5875),
        (294.490531854, 101.092, 1.5875),
    ]]
    fillet(fillet3_edges, radius=FILLET3_R)


solid = part.part
